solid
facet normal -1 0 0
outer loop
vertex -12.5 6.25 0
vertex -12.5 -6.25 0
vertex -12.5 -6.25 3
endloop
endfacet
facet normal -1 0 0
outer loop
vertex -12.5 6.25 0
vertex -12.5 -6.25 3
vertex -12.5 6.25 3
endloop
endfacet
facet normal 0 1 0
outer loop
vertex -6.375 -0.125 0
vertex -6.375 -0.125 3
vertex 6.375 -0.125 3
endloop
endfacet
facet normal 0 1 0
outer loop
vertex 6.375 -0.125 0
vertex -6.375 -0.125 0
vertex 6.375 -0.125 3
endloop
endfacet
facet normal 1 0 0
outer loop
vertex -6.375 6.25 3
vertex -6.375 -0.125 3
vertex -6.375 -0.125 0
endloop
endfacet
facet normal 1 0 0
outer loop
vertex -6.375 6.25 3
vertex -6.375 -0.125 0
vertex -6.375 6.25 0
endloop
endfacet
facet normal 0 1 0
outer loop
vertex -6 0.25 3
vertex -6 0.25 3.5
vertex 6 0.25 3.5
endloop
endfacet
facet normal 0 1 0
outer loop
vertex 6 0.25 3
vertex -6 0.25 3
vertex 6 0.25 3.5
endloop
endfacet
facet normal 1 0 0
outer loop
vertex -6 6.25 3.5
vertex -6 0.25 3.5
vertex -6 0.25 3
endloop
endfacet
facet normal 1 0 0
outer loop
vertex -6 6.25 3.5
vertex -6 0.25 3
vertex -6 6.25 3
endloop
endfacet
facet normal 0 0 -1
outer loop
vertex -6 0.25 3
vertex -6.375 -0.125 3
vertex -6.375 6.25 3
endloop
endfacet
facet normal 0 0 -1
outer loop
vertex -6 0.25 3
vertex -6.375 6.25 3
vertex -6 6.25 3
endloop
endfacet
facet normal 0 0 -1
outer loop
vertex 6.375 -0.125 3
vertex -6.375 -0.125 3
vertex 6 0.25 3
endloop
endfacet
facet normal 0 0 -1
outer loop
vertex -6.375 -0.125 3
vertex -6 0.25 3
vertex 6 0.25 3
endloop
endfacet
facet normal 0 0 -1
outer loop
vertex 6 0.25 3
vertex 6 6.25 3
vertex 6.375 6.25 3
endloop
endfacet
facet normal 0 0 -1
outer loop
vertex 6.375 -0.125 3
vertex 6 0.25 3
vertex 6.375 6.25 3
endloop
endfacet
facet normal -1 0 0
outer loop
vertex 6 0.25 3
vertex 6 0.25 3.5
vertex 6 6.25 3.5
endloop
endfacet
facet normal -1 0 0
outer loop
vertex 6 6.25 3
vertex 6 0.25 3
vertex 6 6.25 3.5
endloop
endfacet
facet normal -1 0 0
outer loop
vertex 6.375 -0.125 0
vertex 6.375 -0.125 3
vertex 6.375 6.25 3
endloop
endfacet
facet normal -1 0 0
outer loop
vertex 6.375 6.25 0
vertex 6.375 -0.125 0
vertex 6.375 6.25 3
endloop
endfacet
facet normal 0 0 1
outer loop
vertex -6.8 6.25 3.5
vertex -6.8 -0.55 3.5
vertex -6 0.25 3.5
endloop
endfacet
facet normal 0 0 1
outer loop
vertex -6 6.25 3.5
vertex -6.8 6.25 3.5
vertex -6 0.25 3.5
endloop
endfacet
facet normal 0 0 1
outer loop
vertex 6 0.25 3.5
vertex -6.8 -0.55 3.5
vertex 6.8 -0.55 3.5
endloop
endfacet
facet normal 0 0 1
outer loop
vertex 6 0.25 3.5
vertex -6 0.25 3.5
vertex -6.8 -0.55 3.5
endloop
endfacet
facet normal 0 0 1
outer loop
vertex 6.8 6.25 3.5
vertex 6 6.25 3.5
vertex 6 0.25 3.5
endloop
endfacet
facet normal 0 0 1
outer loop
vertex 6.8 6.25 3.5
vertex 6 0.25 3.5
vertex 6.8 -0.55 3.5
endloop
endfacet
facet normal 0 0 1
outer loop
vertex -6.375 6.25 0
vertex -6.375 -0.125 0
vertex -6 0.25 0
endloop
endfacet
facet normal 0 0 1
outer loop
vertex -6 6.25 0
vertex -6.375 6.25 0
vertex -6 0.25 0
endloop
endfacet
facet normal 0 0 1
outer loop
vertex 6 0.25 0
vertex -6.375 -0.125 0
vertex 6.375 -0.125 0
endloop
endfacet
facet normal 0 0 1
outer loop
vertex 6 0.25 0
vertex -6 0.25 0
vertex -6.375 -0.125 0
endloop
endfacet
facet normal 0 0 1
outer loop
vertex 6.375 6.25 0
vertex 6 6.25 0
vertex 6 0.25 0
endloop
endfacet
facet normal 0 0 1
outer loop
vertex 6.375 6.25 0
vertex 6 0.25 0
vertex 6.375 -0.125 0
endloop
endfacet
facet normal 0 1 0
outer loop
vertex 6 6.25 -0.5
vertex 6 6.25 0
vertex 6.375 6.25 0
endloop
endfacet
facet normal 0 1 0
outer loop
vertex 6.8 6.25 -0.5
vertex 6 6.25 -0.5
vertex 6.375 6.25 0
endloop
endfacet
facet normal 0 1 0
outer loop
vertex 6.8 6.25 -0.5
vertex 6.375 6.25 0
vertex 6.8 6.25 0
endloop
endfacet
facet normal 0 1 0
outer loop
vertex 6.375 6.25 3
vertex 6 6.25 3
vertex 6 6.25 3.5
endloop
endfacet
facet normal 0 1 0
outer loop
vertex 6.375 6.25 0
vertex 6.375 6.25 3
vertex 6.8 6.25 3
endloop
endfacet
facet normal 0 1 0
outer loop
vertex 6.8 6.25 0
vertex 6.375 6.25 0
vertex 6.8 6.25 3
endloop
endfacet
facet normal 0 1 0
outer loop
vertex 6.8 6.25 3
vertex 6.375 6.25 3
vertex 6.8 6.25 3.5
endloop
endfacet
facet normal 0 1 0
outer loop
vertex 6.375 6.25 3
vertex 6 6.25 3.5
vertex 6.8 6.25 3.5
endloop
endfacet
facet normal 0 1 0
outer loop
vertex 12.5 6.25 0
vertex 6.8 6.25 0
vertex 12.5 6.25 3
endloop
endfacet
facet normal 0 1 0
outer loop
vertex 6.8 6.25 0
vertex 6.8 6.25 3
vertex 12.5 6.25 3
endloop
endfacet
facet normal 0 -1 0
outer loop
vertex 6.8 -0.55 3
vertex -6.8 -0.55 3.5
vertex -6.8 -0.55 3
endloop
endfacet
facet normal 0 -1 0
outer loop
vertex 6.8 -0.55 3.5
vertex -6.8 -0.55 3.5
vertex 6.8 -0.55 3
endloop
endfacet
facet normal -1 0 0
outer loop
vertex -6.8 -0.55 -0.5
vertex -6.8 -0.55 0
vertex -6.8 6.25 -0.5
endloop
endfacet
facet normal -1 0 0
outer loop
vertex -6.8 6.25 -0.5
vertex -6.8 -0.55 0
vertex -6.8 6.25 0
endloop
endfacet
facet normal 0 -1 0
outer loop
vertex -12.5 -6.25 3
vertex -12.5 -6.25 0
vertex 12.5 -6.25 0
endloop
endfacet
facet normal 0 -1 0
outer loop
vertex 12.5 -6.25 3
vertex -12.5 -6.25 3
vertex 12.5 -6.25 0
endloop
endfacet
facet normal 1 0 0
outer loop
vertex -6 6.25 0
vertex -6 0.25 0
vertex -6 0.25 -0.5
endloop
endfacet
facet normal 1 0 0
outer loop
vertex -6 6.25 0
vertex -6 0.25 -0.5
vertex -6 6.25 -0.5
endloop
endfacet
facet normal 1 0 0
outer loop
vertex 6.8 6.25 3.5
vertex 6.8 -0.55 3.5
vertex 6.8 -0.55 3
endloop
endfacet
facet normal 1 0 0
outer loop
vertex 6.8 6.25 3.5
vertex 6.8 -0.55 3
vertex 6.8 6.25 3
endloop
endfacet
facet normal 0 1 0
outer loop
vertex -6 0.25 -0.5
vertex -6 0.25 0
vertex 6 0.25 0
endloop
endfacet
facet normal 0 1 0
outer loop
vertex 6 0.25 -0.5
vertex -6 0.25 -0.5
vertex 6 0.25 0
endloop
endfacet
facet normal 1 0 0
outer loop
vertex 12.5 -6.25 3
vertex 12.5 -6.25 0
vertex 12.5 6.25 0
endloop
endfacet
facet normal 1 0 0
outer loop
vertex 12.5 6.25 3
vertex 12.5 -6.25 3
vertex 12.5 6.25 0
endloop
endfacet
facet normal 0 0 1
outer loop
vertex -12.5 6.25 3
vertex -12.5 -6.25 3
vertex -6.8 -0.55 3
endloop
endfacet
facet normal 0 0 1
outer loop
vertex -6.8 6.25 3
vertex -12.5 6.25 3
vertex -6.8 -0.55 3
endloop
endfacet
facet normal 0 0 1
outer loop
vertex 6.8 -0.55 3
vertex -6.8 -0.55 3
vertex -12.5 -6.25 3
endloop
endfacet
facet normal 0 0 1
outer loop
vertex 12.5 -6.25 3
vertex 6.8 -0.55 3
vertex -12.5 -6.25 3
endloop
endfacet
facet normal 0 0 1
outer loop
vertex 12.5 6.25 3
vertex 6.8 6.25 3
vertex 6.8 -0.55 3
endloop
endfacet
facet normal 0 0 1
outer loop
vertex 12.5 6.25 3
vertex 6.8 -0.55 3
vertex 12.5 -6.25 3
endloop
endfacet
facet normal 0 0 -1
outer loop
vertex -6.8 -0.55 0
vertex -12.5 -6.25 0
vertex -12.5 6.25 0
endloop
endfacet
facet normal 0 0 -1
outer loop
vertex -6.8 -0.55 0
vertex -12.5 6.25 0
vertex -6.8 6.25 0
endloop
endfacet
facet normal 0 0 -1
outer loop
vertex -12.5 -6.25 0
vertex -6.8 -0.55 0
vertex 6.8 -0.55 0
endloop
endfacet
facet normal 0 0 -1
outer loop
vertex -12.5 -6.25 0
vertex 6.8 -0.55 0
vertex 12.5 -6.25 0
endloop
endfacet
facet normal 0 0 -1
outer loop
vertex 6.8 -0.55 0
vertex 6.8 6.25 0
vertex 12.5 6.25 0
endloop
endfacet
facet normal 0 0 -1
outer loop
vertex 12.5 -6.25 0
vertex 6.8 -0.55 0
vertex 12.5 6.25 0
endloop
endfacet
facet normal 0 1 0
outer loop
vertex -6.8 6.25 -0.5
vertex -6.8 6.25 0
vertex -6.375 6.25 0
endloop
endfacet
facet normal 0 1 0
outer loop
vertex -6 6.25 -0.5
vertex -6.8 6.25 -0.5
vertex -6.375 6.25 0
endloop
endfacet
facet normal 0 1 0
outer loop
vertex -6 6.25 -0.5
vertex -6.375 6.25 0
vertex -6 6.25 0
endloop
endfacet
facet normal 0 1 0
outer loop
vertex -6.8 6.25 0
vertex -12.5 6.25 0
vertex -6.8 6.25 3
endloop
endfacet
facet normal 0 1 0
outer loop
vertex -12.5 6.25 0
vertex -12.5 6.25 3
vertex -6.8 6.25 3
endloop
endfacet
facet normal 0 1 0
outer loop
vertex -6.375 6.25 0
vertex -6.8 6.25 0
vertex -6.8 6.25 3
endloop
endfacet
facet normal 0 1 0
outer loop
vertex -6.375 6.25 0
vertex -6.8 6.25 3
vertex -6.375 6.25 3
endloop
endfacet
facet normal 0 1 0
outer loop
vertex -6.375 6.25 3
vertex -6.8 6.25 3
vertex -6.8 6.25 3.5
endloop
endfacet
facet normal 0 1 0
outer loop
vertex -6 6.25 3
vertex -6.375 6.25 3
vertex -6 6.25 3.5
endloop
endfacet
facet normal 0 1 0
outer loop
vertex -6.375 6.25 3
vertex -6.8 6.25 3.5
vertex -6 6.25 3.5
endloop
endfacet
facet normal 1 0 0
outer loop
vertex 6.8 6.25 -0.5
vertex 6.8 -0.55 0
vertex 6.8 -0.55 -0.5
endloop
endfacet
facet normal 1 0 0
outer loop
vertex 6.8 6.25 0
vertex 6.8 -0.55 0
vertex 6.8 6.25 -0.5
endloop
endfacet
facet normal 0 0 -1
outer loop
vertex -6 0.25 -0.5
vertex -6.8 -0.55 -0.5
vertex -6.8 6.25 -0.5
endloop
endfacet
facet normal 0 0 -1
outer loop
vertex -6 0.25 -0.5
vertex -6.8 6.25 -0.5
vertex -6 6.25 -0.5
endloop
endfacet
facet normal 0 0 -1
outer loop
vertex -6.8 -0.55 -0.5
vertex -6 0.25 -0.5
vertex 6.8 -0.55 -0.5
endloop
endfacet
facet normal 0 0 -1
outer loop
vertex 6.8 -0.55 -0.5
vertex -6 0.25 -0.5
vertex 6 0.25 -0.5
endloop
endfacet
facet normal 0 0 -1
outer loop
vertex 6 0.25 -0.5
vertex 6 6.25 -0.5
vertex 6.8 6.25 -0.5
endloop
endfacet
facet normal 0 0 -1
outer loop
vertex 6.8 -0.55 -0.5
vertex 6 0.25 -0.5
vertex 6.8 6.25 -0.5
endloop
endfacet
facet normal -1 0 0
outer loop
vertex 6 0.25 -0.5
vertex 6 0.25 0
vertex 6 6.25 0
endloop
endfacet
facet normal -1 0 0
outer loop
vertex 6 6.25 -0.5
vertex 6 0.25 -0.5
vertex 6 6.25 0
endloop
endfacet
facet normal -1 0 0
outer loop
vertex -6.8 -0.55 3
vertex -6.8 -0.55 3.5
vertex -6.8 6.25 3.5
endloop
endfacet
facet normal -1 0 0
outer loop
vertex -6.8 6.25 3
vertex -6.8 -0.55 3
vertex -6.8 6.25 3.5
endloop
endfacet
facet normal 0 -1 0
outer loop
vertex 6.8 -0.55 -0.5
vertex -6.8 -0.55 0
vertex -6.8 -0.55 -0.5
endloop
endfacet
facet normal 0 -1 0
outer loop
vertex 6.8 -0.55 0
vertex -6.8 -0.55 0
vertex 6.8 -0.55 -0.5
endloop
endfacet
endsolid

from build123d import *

# Parameters (mm, degrees)
SKETCH1_W           = 25
SKETCH1_H           = 12.5
BOSS_EXTRUDE1_DEPTH = 3
BOSS_EXTRUDE3_START = -1.5
SKETCH2_W           = 13.6
SKETCH2_H           = 6.8
BOSS_EXTRUDE3_DEPTH = 2
CUT_EXTRUDE2_START  = -2
SKETCH4_W           = 12.75
SKETCH4_H           = 6.375
CUT_EXTRUDE2_DEPTH  = 1.5
SKETCH5_W           = 12
SKETCH5_H           = 6
CUT_EXTRUDE3_DEPTH  = 5


with BuildPart() as part:
    # Sketch1 → Boss-Extrude1 (new body)
    with BuildSketch(Plane.XY):
        Rectangle(SKETCH1_W, SKETCH1_H)
    extrude(amount=BOSS_EXTRUDE1_DEPTH)

    # Sketch2 → Boss-Extrude3 (add, symmetric)
    with BuildSketch(Plane.XY.offset(3).offset(BOSS_EXTRUDE3_START)):
        with Locations((0, 2.85)):
            Rectangle(SKETCH2_W, SKETCH2_H)
    extrude(amount=BOSS_EXTRUDE3_DEPTH, both=True)

    # Sketch4 → Cut-Extrude2 (cut, symmetric)
    with BuildSketch(Plane.XY.offset(3.5).offset(CUT_EXTRUDE2_START)):
        with Locations((0, 3.0625)):
            Rectangle(SKETCH4_W, SKETCH4_H)
    extrude(amount=CUT_EXTRUDE2_DEPTH, both=True, mode=Mode.SUBTRACT)

    # Sketch5 → Cut-Extrude3 (cut)
    with BuildSketch(Plane.XY.offset(3.5)):
        with Locations((0, 3.25)):
            Rectangle(SKETCH5_W, SKETCH5_H)
    extrude(amount=-CUT_EXTRUDE3_DEPTH, mode=Mode.SUBTRACT)


solid = part.part
